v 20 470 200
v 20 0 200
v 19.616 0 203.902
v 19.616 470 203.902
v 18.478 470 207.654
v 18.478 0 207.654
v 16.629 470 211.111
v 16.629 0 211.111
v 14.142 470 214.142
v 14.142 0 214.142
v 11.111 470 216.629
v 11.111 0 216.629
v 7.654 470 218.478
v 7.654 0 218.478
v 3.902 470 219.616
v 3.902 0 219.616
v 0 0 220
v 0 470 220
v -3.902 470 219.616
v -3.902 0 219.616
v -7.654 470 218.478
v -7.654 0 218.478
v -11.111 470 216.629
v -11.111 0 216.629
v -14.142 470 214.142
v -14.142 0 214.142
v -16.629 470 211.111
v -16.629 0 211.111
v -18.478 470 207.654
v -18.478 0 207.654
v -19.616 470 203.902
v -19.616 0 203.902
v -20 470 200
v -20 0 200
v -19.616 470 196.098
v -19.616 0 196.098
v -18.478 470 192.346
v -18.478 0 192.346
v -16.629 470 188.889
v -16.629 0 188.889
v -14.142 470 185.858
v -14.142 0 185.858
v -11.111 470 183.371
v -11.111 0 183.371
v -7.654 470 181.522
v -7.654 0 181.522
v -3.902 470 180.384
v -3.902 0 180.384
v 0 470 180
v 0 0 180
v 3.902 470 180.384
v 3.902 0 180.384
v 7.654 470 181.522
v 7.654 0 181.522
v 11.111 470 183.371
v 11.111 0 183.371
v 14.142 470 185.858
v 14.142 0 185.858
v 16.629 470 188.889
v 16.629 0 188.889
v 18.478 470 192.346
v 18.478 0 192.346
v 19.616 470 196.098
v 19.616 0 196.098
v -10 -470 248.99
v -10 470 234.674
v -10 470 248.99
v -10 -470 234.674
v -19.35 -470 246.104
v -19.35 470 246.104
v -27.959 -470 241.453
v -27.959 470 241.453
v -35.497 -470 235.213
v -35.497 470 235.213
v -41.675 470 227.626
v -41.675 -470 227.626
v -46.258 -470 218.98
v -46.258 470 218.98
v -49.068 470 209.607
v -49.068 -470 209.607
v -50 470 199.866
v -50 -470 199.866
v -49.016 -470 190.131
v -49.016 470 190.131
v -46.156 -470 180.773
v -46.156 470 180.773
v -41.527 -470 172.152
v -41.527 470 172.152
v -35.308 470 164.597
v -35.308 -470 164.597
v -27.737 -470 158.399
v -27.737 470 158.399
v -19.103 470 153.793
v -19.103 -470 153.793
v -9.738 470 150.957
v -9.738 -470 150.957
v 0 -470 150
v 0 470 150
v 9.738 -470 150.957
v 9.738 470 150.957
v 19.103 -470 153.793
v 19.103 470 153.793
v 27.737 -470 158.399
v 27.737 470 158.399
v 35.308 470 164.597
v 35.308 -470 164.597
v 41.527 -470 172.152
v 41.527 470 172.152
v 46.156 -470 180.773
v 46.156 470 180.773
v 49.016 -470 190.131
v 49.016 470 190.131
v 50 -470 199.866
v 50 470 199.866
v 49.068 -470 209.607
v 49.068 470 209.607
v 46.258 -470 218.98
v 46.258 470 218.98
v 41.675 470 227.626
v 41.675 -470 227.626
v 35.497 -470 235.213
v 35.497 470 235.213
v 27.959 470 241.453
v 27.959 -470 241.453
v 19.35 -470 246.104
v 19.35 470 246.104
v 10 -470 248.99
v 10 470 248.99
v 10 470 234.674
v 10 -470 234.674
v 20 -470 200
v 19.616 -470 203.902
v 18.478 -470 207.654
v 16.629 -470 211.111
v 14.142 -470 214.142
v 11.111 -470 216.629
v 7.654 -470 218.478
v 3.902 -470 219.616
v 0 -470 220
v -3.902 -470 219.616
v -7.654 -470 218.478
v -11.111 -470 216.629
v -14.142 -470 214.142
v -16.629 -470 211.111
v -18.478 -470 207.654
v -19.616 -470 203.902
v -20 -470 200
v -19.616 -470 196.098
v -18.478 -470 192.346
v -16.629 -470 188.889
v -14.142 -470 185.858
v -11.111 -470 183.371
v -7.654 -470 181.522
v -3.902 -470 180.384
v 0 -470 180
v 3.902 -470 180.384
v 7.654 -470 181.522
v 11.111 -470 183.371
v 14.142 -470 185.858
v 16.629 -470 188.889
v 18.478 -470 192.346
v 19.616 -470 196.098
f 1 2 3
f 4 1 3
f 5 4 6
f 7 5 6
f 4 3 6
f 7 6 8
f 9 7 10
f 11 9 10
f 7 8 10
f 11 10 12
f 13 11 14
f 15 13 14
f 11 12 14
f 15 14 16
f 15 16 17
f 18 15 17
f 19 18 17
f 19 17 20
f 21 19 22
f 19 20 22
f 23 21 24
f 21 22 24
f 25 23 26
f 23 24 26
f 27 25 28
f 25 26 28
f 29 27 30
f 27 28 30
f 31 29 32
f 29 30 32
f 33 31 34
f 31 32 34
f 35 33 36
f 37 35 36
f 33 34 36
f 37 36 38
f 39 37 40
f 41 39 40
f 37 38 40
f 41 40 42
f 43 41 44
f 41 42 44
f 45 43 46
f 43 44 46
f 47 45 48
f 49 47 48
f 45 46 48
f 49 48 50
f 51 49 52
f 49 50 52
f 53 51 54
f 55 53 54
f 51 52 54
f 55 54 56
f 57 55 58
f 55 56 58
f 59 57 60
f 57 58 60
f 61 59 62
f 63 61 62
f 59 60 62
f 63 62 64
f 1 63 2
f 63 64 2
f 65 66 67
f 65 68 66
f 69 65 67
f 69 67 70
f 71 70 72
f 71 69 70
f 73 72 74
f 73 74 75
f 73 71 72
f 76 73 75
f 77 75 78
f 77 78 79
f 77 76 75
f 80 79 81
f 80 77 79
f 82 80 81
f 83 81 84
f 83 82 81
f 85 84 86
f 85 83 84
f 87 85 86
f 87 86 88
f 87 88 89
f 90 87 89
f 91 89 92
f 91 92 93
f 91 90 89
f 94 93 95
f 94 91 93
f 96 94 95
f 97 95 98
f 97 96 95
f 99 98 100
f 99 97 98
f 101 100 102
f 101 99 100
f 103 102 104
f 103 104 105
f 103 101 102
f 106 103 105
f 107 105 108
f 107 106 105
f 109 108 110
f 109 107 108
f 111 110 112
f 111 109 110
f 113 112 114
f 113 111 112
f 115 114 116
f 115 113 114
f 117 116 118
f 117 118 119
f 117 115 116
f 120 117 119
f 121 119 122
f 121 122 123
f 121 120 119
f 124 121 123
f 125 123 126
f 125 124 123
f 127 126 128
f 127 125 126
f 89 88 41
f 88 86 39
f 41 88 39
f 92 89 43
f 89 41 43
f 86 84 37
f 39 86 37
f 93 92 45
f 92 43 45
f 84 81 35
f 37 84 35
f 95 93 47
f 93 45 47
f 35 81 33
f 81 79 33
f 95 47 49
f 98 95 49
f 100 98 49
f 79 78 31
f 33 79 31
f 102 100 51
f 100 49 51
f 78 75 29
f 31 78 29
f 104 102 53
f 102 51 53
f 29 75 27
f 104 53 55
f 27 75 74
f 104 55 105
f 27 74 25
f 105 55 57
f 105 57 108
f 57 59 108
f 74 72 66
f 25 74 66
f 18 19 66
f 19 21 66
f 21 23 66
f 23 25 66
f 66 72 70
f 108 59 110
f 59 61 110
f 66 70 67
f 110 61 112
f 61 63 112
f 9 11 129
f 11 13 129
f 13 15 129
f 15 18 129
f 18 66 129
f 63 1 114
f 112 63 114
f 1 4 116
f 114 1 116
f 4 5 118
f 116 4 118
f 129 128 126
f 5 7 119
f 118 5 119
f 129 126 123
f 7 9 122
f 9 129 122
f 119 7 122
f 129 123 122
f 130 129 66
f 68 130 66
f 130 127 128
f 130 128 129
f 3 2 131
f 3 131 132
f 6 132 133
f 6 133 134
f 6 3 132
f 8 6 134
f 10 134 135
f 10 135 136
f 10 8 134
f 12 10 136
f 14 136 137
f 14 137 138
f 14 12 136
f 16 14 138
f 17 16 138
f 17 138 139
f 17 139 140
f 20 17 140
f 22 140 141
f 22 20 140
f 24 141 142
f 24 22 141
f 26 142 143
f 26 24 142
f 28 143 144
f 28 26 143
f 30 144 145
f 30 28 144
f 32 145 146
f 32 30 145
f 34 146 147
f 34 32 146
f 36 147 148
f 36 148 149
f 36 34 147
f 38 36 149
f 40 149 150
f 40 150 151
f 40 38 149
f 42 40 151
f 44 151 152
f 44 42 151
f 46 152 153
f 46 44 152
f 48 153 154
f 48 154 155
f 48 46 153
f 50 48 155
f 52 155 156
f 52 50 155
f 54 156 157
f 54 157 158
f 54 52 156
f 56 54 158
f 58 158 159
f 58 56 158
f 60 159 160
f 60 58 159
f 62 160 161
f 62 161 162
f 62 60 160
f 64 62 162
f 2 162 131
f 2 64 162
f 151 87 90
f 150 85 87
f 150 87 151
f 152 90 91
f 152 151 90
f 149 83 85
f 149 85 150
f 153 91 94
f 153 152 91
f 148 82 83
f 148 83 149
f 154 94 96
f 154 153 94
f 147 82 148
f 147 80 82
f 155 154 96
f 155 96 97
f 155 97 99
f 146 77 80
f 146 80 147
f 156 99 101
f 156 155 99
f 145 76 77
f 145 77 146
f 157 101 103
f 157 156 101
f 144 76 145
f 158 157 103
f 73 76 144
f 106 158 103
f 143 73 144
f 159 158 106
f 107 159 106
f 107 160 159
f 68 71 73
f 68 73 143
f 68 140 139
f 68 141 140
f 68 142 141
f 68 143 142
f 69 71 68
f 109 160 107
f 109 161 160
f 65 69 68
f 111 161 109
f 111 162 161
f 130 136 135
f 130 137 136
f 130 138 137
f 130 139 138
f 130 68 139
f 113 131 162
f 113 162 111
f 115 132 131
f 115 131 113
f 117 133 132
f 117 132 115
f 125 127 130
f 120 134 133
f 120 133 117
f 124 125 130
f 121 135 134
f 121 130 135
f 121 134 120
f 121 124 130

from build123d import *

# Parameters (mm, degrees)
F0_R          = 20
F1_DEPTH      = 470
F1_DEPTH_BACK = 470


with BuildPart() as f1:
    # F0 (on Front) → F1 (new body, two sides)
    with BuildSketch(Plane.XZ) as f1_sk:
        with BuildLine():
            Line((-10, 234.674186), (-10, 248.989795))
            ThreePointArc((-10, 248.989795), (0, 150), (10, 248.989795))
            Line((10, 248.989795), (10, 234.674186))
            Line((10, 234.674186), (-10, 234.674186))
        make_face()
        with Locations((0, 200)):
            Circle(F0_R, mode=Mode.SUBTRACT)
    extrude(amount=F1_DEPTH)
    extrude(f1_sk.sketch, amount=-F1_DEPTH_BACK)


solid = f1.part
